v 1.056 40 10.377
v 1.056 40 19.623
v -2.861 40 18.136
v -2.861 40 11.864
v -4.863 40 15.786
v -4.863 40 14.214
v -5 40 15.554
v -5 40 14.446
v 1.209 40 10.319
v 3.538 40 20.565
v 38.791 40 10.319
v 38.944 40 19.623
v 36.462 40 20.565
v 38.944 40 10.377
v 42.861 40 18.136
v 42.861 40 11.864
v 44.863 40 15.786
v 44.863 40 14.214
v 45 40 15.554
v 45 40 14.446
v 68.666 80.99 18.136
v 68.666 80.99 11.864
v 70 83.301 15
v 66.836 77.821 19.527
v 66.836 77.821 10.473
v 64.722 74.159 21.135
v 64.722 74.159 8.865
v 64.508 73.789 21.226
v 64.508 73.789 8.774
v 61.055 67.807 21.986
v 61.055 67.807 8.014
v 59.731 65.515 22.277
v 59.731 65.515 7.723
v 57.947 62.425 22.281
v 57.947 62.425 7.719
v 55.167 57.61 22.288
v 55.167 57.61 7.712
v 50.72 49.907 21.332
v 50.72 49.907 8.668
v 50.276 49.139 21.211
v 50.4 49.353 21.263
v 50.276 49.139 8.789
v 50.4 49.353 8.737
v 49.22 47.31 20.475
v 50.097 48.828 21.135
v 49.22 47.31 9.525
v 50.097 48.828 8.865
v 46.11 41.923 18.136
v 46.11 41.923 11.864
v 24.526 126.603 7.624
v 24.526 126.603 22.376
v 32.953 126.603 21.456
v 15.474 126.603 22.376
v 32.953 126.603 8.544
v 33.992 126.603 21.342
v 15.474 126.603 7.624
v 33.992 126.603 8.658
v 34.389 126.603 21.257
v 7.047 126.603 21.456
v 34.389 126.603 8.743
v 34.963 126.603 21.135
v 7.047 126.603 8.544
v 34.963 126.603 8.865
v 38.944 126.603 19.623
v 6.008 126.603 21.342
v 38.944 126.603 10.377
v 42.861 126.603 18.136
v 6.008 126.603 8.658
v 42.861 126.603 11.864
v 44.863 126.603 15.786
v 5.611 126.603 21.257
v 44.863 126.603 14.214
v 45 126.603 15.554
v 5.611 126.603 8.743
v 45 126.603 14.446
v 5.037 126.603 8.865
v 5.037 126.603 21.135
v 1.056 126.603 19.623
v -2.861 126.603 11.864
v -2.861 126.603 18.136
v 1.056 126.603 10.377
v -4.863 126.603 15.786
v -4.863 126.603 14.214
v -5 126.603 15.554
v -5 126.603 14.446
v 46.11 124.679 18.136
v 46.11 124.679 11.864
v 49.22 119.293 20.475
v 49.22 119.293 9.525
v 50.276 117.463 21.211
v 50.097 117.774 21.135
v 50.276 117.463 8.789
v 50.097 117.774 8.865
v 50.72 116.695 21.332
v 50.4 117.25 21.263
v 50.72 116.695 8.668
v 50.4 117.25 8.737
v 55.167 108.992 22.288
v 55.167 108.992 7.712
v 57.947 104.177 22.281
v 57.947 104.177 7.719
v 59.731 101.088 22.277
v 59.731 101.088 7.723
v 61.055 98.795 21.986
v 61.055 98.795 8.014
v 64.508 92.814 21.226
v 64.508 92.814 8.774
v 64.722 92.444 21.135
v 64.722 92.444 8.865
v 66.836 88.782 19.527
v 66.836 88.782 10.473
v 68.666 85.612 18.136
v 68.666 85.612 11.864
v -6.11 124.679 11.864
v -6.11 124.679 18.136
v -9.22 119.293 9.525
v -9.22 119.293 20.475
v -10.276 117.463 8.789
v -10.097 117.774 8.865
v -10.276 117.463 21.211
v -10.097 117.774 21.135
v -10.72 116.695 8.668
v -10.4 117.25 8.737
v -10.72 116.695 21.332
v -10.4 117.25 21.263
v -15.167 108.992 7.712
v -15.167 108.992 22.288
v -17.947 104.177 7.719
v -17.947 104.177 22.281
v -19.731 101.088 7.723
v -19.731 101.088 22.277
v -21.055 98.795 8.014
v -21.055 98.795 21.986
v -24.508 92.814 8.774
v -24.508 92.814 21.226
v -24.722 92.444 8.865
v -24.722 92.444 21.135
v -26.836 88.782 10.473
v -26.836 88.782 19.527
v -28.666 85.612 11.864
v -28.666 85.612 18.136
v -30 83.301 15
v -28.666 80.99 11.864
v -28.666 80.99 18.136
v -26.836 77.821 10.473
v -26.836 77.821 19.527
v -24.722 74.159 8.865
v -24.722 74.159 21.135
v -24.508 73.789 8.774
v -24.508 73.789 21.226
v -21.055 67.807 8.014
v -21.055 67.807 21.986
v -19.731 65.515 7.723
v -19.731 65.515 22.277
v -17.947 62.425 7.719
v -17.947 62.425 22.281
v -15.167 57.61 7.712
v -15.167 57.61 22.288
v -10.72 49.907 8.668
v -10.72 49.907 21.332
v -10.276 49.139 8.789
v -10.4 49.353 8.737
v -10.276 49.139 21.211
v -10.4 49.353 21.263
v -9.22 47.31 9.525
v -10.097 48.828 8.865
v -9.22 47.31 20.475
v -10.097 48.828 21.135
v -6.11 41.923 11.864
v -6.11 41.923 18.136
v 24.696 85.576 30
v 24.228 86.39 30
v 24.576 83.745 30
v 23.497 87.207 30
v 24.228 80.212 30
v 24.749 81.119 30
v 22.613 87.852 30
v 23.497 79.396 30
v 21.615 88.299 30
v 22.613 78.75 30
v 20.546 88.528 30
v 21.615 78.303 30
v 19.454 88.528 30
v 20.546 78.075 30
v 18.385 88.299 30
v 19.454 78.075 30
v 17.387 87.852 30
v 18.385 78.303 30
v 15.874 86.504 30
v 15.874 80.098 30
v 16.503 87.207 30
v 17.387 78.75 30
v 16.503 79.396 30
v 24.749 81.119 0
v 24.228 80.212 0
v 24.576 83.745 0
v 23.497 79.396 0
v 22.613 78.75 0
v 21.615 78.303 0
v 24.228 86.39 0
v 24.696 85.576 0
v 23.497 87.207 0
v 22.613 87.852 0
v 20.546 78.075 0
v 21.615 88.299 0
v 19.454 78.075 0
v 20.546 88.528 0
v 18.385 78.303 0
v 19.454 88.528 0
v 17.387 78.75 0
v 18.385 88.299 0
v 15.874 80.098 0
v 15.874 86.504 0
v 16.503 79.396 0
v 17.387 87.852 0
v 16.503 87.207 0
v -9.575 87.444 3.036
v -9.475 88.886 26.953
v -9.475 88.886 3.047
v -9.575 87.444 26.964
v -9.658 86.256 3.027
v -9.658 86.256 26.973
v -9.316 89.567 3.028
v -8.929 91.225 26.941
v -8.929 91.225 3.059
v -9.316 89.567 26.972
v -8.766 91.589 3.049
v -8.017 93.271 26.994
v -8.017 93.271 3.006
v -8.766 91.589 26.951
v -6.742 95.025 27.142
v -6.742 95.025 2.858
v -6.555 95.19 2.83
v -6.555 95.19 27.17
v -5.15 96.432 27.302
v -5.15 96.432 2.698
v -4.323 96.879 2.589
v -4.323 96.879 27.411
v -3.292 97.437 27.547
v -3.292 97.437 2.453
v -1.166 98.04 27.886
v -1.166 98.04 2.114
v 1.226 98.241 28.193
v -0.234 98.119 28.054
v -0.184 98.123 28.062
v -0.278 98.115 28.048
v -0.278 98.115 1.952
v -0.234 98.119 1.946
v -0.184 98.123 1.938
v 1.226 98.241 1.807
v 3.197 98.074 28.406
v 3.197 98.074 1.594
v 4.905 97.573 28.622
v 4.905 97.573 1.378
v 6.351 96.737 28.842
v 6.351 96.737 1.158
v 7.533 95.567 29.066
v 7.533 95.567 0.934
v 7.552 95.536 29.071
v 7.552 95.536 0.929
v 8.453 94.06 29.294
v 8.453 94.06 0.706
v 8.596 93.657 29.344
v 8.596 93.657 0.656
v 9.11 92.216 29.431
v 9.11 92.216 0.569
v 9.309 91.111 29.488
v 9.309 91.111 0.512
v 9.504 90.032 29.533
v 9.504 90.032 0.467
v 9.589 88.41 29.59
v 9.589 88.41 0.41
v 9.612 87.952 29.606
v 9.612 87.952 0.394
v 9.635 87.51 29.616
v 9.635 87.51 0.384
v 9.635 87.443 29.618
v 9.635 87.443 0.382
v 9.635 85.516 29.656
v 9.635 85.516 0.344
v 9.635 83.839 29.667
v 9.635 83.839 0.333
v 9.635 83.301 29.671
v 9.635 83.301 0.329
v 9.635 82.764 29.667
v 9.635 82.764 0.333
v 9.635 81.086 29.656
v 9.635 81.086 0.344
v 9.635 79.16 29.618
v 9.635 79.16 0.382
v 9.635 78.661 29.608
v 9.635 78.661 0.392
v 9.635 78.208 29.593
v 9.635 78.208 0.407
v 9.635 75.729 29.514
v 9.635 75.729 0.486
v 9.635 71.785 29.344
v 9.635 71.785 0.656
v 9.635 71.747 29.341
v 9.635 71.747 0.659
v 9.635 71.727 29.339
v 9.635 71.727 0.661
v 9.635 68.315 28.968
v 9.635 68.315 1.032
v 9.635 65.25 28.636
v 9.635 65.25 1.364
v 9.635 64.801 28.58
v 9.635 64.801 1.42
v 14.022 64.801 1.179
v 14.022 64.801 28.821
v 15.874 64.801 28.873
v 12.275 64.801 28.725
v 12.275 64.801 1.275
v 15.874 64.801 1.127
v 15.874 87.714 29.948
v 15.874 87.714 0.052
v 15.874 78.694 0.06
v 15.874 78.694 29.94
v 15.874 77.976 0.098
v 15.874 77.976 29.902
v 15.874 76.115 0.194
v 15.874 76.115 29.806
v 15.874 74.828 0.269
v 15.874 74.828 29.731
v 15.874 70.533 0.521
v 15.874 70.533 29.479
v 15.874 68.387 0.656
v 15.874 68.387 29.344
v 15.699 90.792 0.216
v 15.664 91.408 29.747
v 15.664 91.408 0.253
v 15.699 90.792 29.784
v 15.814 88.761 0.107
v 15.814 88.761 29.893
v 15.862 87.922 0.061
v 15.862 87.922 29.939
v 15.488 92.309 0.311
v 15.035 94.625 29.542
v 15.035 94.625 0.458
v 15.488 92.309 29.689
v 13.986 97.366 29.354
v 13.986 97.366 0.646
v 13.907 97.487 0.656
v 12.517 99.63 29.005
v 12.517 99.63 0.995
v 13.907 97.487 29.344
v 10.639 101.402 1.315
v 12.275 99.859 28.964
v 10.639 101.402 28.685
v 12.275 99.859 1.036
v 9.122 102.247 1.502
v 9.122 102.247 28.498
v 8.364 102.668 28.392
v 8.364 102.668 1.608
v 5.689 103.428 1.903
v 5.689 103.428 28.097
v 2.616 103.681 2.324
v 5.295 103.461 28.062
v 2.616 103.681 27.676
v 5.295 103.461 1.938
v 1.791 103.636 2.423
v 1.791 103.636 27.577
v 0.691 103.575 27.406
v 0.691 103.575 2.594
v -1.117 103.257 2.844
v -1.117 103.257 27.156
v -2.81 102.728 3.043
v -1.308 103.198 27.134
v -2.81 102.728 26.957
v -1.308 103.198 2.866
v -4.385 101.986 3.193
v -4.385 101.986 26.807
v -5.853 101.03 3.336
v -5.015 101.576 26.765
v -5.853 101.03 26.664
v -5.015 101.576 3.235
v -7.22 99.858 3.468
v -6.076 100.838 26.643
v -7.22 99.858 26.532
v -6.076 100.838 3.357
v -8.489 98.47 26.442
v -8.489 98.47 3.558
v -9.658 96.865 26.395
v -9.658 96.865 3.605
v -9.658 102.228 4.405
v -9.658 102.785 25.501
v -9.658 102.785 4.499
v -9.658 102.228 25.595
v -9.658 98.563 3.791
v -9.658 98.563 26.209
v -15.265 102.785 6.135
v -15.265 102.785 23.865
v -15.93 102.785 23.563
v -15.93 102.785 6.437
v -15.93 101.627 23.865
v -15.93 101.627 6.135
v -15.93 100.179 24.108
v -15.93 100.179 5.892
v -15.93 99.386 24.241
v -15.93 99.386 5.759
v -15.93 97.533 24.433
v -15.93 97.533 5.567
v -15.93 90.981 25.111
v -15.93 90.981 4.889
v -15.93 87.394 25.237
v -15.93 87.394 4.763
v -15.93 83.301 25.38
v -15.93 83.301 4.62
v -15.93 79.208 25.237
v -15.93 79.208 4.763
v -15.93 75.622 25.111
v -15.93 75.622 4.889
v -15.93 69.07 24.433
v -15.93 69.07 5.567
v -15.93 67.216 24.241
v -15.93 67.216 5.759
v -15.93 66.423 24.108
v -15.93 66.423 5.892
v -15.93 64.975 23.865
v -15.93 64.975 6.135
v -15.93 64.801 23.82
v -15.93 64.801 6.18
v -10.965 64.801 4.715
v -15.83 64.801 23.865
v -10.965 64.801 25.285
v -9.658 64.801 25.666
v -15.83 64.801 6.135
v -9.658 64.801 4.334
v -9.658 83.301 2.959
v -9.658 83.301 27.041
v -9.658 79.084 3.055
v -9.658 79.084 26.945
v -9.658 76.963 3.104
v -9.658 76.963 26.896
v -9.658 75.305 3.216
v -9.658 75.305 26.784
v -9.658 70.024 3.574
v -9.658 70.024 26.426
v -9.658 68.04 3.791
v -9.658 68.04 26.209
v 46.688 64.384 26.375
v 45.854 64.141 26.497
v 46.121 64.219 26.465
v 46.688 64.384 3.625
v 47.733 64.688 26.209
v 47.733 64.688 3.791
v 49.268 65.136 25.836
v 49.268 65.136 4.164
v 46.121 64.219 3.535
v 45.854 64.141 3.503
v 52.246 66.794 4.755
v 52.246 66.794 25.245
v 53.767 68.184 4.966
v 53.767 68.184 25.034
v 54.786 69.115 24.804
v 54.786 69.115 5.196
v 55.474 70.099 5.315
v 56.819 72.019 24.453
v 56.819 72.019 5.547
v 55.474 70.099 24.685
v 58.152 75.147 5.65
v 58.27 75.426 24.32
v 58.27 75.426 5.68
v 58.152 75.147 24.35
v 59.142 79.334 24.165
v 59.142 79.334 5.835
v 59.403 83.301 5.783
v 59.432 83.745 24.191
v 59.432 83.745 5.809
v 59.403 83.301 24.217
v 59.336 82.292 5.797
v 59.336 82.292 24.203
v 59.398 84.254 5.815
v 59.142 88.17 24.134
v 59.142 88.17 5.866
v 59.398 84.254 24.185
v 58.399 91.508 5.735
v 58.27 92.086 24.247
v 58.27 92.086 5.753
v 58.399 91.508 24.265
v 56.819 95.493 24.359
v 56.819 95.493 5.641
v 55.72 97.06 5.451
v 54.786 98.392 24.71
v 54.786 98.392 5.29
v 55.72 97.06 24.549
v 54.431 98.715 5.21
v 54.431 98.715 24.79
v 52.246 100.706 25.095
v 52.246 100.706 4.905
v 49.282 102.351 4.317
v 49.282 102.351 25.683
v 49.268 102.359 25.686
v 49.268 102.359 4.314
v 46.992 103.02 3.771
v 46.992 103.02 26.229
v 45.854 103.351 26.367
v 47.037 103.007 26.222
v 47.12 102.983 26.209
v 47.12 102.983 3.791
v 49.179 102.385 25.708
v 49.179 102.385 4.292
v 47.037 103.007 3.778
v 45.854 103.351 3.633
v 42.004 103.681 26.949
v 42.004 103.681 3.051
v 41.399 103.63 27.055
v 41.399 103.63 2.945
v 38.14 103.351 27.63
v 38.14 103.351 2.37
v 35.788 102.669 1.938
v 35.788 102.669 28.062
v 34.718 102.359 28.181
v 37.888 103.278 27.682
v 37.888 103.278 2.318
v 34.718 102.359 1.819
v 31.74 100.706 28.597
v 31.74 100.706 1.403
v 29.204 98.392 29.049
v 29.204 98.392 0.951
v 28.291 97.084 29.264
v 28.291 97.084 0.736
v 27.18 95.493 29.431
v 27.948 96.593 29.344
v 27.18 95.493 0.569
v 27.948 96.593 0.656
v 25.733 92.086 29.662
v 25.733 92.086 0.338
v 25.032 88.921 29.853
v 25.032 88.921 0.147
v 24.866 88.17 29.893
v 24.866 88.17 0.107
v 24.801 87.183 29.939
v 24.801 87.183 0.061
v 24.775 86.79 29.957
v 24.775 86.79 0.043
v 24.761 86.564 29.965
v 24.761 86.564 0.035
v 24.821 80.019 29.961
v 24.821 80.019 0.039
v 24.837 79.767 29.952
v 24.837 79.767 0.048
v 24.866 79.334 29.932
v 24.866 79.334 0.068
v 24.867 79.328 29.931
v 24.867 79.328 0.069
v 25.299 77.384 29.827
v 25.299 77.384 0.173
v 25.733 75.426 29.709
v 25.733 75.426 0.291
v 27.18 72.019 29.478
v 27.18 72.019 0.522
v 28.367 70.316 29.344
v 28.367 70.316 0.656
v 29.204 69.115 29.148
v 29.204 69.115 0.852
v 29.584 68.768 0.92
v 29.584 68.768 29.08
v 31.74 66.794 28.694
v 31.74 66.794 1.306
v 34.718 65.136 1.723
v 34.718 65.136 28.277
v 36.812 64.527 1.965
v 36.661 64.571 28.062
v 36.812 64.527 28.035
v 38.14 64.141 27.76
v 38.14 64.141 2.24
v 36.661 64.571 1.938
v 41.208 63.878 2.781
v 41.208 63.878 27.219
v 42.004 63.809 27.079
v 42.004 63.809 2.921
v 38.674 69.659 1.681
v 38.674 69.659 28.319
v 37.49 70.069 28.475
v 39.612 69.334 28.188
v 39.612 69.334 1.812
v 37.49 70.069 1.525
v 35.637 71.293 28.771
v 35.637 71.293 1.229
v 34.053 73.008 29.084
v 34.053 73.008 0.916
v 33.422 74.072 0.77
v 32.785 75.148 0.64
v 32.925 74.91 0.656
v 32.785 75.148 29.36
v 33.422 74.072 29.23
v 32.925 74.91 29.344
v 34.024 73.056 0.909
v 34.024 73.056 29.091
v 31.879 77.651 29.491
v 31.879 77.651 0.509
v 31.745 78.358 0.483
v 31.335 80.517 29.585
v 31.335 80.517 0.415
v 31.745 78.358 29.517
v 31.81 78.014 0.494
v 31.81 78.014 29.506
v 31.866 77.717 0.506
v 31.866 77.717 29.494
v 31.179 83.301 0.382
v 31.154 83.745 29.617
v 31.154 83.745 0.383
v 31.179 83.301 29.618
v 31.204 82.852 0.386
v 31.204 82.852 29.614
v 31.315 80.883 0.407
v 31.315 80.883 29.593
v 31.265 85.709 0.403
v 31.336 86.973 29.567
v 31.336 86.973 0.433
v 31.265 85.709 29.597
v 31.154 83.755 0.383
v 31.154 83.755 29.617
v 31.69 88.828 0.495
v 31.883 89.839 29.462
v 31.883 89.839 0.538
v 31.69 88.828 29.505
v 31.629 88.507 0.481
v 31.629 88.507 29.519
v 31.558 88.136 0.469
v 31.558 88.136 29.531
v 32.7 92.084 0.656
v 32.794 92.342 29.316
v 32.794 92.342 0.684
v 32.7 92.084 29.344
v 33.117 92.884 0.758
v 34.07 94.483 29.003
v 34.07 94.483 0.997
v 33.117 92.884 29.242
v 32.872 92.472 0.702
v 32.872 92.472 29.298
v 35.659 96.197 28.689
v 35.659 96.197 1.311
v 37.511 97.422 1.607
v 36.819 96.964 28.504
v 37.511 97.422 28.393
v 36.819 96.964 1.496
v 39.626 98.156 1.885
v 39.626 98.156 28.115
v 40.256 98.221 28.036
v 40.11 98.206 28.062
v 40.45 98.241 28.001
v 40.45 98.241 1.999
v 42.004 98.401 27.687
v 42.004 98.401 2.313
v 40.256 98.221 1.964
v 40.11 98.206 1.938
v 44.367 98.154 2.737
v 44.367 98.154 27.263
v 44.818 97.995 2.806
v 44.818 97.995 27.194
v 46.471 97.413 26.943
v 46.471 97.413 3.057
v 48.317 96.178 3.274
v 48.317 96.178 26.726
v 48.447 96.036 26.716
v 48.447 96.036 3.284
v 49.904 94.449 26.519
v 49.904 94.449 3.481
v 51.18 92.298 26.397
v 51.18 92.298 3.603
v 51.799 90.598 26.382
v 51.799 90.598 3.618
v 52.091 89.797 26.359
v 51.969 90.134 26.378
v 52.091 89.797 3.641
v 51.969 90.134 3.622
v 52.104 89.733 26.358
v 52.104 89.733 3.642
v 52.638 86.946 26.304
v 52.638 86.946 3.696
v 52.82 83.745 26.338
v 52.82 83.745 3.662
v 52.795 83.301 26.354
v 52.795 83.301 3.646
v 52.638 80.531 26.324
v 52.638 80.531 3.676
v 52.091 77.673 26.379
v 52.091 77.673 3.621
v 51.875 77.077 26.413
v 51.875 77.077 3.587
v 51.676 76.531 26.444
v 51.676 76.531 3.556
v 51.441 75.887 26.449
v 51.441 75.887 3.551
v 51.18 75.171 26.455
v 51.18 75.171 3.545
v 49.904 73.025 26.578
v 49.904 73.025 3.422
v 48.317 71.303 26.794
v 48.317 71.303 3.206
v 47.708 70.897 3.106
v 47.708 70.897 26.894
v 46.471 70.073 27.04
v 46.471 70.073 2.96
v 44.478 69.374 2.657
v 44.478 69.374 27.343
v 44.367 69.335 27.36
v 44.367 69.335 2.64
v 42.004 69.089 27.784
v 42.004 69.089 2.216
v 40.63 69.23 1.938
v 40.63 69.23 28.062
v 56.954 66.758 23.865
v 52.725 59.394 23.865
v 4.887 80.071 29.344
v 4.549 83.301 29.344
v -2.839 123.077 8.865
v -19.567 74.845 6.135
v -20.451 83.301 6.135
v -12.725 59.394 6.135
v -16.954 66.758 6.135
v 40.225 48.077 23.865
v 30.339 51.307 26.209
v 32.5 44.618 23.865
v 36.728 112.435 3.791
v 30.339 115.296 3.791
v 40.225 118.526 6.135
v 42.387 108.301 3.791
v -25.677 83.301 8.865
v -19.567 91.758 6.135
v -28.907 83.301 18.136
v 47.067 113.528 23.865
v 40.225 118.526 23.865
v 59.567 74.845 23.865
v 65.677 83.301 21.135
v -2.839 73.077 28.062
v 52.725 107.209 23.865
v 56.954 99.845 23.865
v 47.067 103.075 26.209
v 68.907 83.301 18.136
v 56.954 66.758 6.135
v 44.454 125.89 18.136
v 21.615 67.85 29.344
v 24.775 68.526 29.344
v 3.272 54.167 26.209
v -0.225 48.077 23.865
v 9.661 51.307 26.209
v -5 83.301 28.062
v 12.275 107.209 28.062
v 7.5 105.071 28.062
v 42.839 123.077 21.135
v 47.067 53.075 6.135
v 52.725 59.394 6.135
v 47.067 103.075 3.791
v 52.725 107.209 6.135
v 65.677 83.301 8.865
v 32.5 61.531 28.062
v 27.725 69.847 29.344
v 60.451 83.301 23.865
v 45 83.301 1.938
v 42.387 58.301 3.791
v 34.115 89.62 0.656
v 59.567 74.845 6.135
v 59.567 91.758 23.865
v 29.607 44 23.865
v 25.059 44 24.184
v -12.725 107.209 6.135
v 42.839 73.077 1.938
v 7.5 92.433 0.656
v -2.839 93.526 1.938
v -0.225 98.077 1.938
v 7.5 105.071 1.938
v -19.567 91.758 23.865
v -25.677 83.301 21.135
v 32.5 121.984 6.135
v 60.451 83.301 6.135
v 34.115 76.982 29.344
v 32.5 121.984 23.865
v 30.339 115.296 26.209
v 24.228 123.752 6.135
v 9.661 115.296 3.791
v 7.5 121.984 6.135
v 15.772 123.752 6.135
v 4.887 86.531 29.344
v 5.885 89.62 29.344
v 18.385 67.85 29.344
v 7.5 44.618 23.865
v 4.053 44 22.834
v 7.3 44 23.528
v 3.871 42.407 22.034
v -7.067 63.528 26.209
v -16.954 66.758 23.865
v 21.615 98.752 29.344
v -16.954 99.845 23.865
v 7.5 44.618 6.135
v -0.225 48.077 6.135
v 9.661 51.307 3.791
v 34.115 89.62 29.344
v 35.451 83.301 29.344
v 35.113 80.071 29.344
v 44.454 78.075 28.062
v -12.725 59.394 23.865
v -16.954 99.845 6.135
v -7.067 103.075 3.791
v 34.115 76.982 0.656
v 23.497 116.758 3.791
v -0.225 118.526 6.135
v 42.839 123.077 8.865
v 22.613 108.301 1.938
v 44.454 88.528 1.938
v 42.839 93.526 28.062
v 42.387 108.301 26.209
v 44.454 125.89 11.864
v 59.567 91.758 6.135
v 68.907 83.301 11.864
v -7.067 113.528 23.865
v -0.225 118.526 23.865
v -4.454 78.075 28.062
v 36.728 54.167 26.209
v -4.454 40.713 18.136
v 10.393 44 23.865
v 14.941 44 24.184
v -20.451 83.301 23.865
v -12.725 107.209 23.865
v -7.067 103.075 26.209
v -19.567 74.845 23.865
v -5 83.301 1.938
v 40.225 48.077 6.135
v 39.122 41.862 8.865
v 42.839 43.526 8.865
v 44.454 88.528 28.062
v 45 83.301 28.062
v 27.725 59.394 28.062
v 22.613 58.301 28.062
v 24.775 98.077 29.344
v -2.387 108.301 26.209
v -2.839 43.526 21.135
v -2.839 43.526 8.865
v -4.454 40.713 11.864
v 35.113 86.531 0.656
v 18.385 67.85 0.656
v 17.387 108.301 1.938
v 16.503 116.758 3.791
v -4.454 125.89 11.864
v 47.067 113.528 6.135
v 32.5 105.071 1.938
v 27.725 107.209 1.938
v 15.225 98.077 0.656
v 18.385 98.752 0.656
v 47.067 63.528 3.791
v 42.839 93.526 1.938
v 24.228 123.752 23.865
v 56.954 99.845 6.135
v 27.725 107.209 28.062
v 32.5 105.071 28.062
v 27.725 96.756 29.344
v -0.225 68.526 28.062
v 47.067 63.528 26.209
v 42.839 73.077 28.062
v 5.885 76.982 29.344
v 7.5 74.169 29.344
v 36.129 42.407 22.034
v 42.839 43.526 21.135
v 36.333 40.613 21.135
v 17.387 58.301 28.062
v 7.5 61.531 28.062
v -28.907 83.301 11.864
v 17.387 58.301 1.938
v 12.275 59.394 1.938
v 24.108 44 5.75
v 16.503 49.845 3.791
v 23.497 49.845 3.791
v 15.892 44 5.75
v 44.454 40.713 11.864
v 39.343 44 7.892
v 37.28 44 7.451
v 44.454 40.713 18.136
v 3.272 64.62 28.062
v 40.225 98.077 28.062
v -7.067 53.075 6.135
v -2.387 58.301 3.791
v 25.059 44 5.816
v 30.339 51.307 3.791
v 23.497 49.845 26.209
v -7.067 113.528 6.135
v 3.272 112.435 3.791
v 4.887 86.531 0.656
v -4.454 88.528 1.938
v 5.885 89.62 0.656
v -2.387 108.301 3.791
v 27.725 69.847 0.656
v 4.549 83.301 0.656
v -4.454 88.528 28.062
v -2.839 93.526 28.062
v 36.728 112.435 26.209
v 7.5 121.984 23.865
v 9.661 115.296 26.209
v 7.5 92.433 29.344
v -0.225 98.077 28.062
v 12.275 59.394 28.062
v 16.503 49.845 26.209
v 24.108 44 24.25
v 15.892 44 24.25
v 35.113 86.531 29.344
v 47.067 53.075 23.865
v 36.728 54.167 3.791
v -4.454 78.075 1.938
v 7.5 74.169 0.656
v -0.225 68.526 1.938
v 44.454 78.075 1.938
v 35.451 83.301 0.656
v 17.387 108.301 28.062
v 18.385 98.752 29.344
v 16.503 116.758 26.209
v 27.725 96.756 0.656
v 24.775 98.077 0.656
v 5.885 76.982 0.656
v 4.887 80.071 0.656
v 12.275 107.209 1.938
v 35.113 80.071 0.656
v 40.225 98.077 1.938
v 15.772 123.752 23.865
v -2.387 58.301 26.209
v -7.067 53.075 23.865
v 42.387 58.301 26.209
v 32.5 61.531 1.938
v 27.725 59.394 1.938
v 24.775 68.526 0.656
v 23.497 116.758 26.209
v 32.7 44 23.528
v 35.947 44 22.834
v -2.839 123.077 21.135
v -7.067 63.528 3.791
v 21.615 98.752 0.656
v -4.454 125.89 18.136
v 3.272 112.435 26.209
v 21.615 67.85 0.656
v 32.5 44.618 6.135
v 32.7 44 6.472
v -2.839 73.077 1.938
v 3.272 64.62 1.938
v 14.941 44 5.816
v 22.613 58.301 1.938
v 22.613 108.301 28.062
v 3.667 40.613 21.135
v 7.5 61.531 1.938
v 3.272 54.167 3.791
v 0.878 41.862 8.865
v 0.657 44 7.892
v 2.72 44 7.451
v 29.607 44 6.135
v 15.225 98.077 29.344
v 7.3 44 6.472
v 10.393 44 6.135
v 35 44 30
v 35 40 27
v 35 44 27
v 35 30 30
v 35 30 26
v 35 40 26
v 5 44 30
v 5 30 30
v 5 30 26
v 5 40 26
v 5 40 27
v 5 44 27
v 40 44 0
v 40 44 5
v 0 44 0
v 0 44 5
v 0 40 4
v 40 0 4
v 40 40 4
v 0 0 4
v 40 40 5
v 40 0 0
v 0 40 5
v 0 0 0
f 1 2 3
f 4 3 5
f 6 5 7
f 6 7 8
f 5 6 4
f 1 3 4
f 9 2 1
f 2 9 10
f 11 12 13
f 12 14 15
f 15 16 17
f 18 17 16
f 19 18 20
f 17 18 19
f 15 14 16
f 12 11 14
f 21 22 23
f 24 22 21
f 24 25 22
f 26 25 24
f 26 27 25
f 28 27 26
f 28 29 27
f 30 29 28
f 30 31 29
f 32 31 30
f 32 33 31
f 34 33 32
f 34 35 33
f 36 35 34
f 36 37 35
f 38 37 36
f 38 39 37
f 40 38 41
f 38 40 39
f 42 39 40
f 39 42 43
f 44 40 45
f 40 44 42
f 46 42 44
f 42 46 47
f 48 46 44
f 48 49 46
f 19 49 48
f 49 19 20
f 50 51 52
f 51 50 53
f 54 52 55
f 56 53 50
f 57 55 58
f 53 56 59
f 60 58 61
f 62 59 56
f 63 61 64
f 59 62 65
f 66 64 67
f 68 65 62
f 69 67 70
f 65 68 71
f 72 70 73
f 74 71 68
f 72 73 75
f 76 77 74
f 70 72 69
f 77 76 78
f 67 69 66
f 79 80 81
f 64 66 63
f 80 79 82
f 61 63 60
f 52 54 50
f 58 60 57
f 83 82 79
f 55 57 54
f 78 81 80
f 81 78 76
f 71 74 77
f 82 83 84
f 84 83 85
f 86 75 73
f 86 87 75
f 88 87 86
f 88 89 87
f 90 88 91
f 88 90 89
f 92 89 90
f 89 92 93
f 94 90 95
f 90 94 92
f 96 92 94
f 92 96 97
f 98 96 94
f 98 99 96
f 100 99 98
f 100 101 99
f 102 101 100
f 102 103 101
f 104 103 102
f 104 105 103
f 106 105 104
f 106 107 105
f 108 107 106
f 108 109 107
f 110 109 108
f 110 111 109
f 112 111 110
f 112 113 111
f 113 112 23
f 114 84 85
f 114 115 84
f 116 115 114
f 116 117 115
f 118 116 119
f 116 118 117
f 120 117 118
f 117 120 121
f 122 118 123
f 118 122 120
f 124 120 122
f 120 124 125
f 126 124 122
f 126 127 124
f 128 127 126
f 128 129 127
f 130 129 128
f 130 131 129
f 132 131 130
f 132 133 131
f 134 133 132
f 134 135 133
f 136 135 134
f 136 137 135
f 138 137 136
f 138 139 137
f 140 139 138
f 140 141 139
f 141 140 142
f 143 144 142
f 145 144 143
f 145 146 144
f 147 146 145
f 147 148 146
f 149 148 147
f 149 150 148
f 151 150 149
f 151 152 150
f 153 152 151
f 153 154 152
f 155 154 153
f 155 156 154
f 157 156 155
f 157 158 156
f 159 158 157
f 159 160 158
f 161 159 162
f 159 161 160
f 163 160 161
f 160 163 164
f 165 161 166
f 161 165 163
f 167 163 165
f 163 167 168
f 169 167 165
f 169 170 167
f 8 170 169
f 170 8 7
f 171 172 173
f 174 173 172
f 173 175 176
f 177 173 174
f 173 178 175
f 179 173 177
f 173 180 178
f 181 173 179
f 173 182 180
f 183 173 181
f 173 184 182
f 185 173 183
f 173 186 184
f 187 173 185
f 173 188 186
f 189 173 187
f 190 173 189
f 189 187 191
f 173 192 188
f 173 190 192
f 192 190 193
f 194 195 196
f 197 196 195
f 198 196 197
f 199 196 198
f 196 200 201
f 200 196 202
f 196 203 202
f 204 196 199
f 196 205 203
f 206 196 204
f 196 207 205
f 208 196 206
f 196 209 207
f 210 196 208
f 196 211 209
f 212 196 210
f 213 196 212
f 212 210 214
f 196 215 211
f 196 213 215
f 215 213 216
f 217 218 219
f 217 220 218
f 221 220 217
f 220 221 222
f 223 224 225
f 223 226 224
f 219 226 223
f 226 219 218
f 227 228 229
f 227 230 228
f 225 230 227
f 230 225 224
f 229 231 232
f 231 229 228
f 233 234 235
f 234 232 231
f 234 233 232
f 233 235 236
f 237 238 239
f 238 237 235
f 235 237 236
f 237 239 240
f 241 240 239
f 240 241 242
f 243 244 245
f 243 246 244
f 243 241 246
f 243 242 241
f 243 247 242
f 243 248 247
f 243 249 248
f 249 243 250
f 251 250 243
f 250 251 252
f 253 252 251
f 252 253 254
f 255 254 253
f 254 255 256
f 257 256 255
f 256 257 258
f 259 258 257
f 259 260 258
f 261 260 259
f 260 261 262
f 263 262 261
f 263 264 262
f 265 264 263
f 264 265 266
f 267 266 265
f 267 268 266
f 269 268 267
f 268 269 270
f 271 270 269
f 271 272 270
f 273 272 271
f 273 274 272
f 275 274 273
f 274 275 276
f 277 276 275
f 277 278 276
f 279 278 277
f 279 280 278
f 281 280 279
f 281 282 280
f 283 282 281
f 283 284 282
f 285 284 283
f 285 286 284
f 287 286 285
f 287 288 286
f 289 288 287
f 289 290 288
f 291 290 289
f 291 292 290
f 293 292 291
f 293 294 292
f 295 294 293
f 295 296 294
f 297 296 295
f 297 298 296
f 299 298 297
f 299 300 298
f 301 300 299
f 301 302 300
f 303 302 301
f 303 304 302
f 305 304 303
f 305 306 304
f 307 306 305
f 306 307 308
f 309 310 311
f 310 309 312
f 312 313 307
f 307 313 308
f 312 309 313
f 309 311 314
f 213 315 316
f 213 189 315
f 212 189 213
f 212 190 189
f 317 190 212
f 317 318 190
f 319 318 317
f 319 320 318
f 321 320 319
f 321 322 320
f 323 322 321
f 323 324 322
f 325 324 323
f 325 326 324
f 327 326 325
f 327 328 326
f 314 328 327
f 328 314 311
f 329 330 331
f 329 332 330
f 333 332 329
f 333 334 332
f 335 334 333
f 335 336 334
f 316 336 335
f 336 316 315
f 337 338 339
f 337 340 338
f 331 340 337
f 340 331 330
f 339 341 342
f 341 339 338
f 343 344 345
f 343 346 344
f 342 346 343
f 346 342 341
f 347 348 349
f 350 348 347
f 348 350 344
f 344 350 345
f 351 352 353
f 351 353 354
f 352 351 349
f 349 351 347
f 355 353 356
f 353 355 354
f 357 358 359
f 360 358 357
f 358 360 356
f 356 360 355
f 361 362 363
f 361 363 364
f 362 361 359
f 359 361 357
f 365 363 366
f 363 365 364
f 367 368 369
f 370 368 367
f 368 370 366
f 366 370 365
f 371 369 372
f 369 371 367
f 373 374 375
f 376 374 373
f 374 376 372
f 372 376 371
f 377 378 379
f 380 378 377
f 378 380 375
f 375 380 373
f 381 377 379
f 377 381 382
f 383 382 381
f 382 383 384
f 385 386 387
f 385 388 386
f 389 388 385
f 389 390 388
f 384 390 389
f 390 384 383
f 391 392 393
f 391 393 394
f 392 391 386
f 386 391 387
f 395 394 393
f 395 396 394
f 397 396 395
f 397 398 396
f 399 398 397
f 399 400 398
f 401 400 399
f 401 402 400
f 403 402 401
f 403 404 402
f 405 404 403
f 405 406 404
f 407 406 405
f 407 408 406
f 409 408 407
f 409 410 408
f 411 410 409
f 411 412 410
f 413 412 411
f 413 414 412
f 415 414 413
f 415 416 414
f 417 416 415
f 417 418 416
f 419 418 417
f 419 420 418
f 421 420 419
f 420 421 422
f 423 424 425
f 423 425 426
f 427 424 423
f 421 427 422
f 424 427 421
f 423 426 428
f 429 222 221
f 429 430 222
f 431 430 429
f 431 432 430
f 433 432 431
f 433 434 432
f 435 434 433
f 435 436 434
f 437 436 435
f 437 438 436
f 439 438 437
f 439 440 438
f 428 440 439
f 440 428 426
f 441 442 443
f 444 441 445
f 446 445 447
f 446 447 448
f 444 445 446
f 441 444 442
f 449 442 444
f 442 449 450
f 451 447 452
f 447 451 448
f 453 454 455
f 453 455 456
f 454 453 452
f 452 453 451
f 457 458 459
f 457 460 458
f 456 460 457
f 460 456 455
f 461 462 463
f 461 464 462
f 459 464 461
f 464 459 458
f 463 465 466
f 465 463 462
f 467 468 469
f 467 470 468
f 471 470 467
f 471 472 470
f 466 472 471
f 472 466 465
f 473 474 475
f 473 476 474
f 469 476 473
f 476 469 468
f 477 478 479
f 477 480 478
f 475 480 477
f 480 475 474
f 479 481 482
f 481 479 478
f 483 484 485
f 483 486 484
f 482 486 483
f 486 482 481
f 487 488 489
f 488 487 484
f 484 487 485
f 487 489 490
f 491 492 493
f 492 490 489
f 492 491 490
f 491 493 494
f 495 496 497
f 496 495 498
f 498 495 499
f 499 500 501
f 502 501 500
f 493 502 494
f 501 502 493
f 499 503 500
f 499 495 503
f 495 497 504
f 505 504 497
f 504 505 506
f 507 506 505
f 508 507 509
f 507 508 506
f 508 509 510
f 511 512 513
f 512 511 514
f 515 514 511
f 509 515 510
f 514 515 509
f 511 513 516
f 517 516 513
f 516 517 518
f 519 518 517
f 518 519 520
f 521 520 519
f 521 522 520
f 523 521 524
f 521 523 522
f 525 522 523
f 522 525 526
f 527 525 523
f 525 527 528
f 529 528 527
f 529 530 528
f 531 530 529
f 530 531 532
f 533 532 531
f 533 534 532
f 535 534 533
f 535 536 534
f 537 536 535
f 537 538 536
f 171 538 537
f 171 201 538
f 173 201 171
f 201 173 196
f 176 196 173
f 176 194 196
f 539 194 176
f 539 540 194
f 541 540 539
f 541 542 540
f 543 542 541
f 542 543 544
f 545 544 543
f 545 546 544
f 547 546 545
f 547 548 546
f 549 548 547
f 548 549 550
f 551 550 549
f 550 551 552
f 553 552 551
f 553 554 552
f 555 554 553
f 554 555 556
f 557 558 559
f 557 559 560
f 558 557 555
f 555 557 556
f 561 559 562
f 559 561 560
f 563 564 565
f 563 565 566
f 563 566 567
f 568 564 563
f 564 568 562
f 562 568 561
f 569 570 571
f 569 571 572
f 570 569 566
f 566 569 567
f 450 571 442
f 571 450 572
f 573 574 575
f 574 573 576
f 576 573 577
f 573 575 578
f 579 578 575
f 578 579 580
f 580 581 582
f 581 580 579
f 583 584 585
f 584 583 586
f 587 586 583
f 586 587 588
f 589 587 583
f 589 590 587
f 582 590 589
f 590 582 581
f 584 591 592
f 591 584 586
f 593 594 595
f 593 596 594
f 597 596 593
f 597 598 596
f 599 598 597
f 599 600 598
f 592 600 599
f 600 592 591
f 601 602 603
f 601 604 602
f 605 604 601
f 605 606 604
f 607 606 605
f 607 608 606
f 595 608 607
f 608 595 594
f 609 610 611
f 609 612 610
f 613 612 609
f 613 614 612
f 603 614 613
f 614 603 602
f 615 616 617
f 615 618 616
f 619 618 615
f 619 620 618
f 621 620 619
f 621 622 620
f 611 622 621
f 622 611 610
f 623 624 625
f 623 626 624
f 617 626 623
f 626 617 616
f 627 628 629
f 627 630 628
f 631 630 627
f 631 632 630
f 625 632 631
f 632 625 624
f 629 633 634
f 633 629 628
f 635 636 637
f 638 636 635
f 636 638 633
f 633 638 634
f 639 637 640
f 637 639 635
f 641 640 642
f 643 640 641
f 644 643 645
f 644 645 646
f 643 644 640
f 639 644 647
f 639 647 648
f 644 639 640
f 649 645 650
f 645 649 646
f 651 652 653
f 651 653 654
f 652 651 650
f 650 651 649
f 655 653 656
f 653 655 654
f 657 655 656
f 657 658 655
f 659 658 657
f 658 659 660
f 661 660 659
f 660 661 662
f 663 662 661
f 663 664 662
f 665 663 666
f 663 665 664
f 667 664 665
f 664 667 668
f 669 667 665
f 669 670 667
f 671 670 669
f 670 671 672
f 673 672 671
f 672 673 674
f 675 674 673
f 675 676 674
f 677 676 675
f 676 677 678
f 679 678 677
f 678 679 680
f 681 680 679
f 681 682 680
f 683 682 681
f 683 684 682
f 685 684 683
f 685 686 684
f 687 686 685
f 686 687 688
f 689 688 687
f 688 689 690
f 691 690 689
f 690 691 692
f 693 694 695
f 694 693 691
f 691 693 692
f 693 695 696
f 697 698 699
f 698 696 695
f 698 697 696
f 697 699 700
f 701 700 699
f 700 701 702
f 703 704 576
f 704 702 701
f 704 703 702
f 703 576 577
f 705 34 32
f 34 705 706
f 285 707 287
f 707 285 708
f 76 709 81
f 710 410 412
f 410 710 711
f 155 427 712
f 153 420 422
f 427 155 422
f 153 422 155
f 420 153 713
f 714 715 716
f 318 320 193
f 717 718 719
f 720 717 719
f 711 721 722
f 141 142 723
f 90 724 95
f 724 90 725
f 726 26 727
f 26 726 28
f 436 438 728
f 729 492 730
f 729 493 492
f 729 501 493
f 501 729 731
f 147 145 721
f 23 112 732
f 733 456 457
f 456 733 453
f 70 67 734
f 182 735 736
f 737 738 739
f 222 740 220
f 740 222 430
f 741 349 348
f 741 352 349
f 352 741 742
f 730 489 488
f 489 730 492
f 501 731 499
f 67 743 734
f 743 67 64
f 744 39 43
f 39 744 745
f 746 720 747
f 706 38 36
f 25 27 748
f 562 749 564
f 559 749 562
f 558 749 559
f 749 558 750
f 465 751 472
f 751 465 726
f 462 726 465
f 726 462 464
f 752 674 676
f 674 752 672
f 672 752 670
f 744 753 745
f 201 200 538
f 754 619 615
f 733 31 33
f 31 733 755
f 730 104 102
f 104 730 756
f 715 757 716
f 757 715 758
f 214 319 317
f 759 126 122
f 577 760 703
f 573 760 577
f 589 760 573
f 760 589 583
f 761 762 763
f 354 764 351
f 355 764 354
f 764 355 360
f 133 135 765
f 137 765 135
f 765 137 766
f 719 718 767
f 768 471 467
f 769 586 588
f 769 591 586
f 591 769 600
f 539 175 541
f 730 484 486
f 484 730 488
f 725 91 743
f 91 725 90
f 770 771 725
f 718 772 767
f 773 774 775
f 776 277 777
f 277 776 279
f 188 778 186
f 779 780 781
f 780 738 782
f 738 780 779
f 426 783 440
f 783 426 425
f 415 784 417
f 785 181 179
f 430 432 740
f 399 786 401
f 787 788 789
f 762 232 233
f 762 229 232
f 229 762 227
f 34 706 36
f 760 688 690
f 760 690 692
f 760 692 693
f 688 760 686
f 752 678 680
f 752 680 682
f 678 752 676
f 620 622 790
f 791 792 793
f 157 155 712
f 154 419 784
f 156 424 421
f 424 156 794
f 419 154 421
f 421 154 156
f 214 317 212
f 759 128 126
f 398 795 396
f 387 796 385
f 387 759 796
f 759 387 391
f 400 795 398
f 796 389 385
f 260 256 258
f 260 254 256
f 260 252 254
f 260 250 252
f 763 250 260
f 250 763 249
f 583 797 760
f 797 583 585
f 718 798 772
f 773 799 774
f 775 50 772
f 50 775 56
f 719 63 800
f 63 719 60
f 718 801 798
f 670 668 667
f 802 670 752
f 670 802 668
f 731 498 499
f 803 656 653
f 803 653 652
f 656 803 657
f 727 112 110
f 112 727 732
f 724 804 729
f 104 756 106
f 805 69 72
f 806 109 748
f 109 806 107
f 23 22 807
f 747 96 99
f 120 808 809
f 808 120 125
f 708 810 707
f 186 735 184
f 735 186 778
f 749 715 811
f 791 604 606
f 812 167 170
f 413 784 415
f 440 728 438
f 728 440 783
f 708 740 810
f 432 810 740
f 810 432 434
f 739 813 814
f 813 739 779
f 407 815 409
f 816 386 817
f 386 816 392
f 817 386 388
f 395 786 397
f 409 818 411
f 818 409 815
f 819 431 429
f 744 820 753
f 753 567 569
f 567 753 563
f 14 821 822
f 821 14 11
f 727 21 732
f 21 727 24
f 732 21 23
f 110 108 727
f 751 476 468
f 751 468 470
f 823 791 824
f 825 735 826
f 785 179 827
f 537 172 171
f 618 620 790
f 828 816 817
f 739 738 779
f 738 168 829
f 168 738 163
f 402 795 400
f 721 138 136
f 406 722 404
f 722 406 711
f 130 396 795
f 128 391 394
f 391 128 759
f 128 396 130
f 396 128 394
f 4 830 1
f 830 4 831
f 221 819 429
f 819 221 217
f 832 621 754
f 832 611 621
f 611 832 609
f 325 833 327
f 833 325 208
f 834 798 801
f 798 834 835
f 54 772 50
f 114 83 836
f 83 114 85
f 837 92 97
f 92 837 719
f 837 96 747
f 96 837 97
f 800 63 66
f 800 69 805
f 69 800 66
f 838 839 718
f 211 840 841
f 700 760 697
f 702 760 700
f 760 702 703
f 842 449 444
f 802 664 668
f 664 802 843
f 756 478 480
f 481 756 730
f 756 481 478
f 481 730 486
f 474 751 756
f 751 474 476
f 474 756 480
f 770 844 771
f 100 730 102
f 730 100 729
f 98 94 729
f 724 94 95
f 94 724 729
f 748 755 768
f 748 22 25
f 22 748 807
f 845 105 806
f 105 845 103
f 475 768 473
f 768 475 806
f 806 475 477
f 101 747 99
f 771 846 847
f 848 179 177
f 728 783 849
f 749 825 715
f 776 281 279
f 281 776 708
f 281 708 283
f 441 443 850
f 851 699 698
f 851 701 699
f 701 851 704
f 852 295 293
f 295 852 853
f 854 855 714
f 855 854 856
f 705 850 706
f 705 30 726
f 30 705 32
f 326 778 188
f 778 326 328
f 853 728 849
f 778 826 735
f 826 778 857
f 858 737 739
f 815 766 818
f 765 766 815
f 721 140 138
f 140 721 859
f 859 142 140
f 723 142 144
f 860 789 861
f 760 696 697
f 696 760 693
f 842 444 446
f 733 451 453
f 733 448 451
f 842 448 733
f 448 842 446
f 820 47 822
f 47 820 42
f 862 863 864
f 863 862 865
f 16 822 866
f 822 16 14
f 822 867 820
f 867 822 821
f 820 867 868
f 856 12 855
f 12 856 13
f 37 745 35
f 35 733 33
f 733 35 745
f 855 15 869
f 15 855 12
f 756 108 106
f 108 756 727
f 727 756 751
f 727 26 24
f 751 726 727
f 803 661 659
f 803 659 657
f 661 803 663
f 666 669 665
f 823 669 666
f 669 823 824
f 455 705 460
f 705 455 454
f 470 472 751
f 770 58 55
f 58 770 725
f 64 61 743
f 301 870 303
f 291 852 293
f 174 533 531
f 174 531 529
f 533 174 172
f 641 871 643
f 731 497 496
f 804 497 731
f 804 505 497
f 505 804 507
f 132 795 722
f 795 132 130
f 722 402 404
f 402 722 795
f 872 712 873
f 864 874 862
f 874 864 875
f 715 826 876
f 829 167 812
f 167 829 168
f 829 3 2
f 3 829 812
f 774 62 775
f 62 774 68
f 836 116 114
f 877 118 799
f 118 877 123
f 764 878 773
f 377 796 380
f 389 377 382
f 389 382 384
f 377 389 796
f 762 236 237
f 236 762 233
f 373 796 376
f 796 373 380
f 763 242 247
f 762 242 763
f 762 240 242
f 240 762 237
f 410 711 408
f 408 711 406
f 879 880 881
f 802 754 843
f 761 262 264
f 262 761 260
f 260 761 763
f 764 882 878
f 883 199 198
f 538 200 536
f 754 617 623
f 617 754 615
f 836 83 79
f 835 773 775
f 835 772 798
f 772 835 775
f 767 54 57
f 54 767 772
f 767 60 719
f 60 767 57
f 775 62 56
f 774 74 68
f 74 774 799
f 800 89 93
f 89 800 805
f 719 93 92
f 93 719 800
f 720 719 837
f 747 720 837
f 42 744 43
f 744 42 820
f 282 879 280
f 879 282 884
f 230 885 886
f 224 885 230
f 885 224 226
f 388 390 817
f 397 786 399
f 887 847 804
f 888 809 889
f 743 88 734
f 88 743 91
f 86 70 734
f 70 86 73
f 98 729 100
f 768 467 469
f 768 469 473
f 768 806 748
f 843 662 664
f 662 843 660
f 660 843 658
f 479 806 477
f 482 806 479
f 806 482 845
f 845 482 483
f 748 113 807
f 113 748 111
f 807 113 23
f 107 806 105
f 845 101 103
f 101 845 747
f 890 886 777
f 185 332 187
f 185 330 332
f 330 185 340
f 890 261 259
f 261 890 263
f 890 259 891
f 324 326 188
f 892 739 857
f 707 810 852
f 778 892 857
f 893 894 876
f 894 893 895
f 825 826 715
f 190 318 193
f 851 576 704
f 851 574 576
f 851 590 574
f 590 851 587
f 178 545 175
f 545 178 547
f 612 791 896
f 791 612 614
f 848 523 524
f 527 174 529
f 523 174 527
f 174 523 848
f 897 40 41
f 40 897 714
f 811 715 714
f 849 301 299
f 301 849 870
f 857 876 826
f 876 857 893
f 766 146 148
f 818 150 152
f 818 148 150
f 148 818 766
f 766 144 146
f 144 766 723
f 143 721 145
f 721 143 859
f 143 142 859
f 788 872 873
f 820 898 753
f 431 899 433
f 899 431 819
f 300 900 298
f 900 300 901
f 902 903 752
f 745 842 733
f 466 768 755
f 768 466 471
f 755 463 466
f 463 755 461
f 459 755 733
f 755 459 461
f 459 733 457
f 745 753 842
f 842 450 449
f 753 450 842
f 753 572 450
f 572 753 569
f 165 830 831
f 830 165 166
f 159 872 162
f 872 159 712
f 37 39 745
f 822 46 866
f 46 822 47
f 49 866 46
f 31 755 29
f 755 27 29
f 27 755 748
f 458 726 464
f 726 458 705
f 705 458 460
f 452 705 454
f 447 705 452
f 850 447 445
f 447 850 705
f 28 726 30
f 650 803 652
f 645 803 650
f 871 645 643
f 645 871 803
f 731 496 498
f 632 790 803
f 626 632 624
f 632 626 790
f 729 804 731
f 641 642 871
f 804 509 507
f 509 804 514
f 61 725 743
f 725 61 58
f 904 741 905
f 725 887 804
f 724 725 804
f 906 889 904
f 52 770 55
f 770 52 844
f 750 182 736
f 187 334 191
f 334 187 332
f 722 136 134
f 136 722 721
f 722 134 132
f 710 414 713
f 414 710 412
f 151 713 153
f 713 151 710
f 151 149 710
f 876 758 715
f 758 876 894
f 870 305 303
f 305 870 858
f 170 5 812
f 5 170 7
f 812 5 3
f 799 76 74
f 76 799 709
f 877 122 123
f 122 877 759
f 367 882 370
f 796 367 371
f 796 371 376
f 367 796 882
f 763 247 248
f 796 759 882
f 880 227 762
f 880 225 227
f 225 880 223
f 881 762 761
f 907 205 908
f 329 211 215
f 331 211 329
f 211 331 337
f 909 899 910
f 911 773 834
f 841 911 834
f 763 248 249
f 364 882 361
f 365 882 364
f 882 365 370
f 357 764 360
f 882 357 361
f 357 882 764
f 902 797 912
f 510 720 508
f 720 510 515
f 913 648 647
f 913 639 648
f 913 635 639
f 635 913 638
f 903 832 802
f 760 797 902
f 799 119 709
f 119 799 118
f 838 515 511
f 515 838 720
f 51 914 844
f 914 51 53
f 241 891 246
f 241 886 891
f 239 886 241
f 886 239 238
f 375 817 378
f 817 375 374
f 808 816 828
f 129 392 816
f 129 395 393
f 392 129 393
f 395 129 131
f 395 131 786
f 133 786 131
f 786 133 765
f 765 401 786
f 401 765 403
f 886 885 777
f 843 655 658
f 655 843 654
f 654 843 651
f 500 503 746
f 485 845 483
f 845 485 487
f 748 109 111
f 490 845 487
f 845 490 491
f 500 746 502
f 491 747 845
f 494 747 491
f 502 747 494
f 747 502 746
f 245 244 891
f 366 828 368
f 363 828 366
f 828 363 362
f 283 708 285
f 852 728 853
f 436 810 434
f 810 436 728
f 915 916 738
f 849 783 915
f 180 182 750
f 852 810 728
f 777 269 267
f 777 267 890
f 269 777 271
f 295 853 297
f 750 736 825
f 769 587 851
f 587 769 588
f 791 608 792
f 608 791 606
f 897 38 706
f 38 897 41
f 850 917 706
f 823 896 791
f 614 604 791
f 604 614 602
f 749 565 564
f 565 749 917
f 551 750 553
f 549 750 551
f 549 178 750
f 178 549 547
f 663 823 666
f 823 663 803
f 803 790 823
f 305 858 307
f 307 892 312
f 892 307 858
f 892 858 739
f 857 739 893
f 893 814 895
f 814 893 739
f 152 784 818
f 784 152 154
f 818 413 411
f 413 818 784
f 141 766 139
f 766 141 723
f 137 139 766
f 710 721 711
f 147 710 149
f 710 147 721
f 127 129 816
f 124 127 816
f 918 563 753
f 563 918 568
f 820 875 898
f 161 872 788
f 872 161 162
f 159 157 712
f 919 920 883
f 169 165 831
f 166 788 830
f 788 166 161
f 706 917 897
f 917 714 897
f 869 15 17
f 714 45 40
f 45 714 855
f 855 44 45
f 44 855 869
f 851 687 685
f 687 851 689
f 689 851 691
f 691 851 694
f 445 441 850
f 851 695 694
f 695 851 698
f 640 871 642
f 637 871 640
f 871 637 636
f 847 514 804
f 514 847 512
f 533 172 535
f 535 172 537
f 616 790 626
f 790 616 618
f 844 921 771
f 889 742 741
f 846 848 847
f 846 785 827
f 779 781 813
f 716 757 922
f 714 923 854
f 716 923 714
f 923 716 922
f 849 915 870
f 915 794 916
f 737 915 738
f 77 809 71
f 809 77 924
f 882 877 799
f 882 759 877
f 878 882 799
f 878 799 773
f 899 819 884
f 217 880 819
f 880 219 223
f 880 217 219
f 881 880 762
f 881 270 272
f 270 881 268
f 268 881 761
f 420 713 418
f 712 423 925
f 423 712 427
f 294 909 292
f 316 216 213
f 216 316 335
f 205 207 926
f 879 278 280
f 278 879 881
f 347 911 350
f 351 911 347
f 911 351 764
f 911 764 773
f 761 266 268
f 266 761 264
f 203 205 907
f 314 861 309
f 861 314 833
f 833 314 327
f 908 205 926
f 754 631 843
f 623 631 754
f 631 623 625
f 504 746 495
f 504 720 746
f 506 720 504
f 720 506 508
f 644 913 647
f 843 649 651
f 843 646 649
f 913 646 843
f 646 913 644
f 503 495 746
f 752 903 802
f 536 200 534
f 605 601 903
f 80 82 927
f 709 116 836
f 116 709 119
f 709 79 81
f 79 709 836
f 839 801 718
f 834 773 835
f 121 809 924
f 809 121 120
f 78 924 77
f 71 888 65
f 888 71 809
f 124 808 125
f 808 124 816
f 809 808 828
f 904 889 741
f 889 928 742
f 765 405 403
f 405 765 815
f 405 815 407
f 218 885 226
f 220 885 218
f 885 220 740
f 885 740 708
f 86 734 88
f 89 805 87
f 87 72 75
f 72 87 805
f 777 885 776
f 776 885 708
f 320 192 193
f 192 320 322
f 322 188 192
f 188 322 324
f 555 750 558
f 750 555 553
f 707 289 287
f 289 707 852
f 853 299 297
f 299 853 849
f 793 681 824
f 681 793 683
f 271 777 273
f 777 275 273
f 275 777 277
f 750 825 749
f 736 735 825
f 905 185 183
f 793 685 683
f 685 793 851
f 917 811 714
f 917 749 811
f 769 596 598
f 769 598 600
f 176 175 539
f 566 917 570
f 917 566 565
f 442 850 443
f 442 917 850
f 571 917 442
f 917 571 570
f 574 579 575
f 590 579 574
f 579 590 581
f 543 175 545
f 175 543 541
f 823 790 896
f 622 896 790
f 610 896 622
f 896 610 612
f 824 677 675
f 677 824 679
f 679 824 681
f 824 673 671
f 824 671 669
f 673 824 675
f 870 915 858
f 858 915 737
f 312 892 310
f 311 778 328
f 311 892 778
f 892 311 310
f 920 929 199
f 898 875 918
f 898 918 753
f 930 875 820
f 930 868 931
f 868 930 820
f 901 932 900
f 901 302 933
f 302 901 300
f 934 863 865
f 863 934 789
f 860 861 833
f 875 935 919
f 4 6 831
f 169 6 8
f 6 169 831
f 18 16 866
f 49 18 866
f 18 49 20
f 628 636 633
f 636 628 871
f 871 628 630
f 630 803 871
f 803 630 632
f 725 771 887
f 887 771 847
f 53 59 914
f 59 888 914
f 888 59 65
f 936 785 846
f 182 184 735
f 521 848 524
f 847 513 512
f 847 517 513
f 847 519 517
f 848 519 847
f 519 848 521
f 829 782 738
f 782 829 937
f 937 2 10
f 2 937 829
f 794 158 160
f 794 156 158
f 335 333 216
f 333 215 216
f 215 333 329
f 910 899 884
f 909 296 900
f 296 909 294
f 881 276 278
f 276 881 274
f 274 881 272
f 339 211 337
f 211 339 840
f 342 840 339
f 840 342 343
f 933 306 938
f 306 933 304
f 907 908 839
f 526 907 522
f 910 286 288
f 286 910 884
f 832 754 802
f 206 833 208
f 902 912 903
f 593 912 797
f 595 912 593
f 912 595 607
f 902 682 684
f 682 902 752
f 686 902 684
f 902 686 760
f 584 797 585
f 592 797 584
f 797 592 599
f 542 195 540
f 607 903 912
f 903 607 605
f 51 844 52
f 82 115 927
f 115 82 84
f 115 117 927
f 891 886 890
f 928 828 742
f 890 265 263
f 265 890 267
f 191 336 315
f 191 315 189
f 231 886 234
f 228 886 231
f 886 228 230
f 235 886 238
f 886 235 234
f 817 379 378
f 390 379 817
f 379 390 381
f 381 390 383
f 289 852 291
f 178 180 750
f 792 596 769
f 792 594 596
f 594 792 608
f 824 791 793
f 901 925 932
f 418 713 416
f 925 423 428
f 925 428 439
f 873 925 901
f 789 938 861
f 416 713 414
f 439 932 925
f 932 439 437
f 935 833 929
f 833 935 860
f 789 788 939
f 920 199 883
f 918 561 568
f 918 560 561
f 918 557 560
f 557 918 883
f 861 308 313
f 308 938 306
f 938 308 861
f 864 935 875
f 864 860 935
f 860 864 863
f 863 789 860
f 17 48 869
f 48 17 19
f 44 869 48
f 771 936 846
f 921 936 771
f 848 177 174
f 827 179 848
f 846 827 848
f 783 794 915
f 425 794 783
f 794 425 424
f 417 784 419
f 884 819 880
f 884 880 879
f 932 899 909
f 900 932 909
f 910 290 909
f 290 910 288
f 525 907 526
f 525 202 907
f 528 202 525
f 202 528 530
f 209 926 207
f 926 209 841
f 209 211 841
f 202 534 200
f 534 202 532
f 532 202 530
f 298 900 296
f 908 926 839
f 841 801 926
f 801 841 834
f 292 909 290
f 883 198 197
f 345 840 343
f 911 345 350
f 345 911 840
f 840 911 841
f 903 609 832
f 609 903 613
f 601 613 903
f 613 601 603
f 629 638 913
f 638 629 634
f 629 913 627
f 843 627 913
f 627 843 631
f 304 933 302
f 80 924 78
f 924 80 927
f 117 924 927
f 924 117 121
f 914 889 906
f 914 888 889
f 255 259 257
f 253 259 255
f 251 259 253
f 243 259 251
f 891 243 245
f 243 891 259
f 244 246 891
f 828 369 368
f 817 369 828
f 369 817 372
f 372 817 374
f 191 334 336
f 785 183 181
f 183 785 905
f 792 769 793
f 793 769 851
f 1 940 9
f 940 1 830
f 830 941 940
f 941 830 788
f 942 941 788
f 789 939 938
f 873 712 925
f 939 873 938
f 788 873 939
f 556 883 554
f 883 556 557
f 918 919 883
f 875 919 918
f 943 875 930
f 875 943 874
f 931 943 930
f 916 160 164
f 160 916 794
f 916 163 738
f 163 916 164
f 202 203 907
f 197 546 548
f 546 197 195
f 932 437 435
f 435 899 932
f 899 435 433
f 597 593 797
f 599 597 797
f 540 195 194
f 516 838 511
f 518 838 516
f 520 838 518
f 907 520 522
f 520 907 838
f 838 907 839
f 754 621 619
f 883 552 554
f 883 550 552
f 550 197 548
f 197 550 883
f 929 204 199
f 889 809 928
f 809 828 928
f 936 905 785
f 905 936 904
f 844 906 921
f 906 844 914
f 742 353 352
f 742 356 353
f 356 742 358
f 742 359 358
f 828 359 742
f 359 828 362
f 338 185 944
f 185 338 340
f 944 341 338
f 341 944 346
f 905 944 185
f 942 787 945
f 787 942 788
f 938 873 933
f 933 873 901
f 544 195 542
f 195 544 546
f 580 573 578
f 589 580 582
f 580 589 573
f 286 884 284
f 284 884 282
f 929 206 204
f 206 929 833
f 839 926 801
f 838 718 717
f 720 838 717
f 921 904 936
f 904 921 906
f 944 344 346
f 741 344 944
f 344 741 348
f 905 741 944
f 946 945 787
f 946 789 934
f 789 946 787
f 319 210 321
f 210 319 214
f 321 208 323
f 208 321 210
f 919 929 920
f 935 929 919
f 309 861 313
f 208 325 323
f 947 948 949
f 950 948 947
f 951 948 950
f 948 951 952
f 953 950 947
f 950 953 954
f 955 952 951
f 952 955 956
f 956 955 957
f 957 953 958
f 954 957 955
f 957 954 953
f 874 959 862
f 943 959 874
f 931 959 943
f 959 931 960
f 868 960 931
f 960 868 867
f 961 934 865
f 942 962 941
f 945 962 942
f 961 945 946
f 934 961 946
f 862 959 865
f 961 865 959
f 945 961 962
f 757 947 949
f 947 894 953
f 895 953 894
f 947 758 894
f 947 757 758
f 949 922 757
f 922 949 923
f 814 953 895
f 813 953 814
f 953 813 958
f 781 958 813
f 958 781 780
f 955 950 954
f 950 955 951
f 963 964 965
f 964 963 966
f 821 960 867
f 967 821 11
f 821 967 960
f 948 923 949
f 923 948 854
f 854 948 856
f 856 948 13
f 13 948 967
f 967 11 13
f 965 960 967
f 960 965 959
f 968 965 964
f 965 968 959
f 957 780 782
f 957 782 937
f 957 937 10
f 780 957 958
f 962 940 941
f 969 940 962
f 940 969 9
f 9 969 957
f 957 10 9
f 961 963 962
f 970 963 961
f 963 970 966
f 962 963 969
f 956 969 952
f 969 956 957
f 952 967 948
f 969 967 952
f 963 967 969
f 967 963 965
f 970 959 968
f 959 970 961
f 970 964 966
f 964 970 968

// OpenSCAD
// A do-not-disturb sign to put on the monitor

//--- thickness of all parts:
thickness = 4;
//--- the monitor clip
monitor_clip_width_front = 30;
monitor_clip_height_front = 10;
monitor_clip_width_back = 40;
monitor_clip_height_back = 40;
monitor_clip_depth = 22; // monitor thickness
// the stop sign
stop_sign_radius = 50;
stop_sign_back = monitor_clip_depth + thickness; // to the back, to make support obsolete
stop_text = "no";
stop_font = "StHupo";
stop_font_size = 50;
stop_rounded_thickness = monitor_clip_depth + 2*thickness;

// preview resolution:
if($preview)
{
    $fa=1;
    $fs=1.5;
}

//draw
color([255/255, 0/255, 0/255]) 
{
    union()
    {
        // monitor clip, back part
        translate([
            0, 
            0, 
            0]) 
        {
            cube([
                monitor_clip_width_back, 
                monitor_clip_height_back + thickness,
                thickness]);
            //monitor clip: top
            translate([
                0, 
                monitor_clip_height_back, 
                thickness]) 
            {
                hull() 
                {
                    // top back
                    cube([
                        monitor_clip_width_back, 
                        thickness,
                        1]);
                    // top front
                    translate([
                        +monitor_clip_width_back/2 
                            -monitor_clip_width_front/2, 
                        0, 
                        monitor_clip_depth]) 
                    {
                        cube([
                            monitor_clip_width_front, 
                            thickness,
                            1]);
                    }
                }
                translate([
                        +monitor_clip_width_back/2 
                            -monitor_clip_width_front/2, 
                        -monitor_clip_height_front, 
                        monitor_clip_depth]) 
                {
                    // monitor front
                    cube([
                        monitor_clip_width_front, 
                        monitor_clip_height_front + thickness, 
                        thickness]);

                    stop_sign_min_radius = (sqrt(3)/2) * stop_sign_radius;
                    translate([
                        monitor_clip_width_front/2, 
                        monitor_clip_height_front
                            + stop_sign_min_radius, 
                        -stop_sign_back]) 
                    {
                        intersection() 
                        {
                            difference() 
                            {
                                cylinder(
                                    r=stop_sign_radius, 
                                    h=stop_rounded_thickness, 
                                    $fn=6);

                                translate([0, 0, stop_rounded_thickness/2])
                                {
                                    linear_extrude(height=stop_rounded_thickness + 2, center = true) 
                                    {
                                        text(stop_text, 
                                            font = stop_font, 
                                            size = stop_font_size, 
                                            direction = "ltr", 
                                            spacing = 1,
                                            halign = "center",
                                            valign = "center");
                                    };
                                }
                            }
                            if(stop_rounded_thickness > thickness)
                            {
                                translate([0, 0, stop_rounded_thickness/2])
                                {
                                    resize(newsize=[
                                        stop_sign_radius*2,
                                        stop_sign_radius*2,
                                        stop_rounded_thickness
                                        ])
                                        sphere(r=stop_sign_radius);
                                }
                            }
                        }
                    }
                }
            }
        }
    }
}
